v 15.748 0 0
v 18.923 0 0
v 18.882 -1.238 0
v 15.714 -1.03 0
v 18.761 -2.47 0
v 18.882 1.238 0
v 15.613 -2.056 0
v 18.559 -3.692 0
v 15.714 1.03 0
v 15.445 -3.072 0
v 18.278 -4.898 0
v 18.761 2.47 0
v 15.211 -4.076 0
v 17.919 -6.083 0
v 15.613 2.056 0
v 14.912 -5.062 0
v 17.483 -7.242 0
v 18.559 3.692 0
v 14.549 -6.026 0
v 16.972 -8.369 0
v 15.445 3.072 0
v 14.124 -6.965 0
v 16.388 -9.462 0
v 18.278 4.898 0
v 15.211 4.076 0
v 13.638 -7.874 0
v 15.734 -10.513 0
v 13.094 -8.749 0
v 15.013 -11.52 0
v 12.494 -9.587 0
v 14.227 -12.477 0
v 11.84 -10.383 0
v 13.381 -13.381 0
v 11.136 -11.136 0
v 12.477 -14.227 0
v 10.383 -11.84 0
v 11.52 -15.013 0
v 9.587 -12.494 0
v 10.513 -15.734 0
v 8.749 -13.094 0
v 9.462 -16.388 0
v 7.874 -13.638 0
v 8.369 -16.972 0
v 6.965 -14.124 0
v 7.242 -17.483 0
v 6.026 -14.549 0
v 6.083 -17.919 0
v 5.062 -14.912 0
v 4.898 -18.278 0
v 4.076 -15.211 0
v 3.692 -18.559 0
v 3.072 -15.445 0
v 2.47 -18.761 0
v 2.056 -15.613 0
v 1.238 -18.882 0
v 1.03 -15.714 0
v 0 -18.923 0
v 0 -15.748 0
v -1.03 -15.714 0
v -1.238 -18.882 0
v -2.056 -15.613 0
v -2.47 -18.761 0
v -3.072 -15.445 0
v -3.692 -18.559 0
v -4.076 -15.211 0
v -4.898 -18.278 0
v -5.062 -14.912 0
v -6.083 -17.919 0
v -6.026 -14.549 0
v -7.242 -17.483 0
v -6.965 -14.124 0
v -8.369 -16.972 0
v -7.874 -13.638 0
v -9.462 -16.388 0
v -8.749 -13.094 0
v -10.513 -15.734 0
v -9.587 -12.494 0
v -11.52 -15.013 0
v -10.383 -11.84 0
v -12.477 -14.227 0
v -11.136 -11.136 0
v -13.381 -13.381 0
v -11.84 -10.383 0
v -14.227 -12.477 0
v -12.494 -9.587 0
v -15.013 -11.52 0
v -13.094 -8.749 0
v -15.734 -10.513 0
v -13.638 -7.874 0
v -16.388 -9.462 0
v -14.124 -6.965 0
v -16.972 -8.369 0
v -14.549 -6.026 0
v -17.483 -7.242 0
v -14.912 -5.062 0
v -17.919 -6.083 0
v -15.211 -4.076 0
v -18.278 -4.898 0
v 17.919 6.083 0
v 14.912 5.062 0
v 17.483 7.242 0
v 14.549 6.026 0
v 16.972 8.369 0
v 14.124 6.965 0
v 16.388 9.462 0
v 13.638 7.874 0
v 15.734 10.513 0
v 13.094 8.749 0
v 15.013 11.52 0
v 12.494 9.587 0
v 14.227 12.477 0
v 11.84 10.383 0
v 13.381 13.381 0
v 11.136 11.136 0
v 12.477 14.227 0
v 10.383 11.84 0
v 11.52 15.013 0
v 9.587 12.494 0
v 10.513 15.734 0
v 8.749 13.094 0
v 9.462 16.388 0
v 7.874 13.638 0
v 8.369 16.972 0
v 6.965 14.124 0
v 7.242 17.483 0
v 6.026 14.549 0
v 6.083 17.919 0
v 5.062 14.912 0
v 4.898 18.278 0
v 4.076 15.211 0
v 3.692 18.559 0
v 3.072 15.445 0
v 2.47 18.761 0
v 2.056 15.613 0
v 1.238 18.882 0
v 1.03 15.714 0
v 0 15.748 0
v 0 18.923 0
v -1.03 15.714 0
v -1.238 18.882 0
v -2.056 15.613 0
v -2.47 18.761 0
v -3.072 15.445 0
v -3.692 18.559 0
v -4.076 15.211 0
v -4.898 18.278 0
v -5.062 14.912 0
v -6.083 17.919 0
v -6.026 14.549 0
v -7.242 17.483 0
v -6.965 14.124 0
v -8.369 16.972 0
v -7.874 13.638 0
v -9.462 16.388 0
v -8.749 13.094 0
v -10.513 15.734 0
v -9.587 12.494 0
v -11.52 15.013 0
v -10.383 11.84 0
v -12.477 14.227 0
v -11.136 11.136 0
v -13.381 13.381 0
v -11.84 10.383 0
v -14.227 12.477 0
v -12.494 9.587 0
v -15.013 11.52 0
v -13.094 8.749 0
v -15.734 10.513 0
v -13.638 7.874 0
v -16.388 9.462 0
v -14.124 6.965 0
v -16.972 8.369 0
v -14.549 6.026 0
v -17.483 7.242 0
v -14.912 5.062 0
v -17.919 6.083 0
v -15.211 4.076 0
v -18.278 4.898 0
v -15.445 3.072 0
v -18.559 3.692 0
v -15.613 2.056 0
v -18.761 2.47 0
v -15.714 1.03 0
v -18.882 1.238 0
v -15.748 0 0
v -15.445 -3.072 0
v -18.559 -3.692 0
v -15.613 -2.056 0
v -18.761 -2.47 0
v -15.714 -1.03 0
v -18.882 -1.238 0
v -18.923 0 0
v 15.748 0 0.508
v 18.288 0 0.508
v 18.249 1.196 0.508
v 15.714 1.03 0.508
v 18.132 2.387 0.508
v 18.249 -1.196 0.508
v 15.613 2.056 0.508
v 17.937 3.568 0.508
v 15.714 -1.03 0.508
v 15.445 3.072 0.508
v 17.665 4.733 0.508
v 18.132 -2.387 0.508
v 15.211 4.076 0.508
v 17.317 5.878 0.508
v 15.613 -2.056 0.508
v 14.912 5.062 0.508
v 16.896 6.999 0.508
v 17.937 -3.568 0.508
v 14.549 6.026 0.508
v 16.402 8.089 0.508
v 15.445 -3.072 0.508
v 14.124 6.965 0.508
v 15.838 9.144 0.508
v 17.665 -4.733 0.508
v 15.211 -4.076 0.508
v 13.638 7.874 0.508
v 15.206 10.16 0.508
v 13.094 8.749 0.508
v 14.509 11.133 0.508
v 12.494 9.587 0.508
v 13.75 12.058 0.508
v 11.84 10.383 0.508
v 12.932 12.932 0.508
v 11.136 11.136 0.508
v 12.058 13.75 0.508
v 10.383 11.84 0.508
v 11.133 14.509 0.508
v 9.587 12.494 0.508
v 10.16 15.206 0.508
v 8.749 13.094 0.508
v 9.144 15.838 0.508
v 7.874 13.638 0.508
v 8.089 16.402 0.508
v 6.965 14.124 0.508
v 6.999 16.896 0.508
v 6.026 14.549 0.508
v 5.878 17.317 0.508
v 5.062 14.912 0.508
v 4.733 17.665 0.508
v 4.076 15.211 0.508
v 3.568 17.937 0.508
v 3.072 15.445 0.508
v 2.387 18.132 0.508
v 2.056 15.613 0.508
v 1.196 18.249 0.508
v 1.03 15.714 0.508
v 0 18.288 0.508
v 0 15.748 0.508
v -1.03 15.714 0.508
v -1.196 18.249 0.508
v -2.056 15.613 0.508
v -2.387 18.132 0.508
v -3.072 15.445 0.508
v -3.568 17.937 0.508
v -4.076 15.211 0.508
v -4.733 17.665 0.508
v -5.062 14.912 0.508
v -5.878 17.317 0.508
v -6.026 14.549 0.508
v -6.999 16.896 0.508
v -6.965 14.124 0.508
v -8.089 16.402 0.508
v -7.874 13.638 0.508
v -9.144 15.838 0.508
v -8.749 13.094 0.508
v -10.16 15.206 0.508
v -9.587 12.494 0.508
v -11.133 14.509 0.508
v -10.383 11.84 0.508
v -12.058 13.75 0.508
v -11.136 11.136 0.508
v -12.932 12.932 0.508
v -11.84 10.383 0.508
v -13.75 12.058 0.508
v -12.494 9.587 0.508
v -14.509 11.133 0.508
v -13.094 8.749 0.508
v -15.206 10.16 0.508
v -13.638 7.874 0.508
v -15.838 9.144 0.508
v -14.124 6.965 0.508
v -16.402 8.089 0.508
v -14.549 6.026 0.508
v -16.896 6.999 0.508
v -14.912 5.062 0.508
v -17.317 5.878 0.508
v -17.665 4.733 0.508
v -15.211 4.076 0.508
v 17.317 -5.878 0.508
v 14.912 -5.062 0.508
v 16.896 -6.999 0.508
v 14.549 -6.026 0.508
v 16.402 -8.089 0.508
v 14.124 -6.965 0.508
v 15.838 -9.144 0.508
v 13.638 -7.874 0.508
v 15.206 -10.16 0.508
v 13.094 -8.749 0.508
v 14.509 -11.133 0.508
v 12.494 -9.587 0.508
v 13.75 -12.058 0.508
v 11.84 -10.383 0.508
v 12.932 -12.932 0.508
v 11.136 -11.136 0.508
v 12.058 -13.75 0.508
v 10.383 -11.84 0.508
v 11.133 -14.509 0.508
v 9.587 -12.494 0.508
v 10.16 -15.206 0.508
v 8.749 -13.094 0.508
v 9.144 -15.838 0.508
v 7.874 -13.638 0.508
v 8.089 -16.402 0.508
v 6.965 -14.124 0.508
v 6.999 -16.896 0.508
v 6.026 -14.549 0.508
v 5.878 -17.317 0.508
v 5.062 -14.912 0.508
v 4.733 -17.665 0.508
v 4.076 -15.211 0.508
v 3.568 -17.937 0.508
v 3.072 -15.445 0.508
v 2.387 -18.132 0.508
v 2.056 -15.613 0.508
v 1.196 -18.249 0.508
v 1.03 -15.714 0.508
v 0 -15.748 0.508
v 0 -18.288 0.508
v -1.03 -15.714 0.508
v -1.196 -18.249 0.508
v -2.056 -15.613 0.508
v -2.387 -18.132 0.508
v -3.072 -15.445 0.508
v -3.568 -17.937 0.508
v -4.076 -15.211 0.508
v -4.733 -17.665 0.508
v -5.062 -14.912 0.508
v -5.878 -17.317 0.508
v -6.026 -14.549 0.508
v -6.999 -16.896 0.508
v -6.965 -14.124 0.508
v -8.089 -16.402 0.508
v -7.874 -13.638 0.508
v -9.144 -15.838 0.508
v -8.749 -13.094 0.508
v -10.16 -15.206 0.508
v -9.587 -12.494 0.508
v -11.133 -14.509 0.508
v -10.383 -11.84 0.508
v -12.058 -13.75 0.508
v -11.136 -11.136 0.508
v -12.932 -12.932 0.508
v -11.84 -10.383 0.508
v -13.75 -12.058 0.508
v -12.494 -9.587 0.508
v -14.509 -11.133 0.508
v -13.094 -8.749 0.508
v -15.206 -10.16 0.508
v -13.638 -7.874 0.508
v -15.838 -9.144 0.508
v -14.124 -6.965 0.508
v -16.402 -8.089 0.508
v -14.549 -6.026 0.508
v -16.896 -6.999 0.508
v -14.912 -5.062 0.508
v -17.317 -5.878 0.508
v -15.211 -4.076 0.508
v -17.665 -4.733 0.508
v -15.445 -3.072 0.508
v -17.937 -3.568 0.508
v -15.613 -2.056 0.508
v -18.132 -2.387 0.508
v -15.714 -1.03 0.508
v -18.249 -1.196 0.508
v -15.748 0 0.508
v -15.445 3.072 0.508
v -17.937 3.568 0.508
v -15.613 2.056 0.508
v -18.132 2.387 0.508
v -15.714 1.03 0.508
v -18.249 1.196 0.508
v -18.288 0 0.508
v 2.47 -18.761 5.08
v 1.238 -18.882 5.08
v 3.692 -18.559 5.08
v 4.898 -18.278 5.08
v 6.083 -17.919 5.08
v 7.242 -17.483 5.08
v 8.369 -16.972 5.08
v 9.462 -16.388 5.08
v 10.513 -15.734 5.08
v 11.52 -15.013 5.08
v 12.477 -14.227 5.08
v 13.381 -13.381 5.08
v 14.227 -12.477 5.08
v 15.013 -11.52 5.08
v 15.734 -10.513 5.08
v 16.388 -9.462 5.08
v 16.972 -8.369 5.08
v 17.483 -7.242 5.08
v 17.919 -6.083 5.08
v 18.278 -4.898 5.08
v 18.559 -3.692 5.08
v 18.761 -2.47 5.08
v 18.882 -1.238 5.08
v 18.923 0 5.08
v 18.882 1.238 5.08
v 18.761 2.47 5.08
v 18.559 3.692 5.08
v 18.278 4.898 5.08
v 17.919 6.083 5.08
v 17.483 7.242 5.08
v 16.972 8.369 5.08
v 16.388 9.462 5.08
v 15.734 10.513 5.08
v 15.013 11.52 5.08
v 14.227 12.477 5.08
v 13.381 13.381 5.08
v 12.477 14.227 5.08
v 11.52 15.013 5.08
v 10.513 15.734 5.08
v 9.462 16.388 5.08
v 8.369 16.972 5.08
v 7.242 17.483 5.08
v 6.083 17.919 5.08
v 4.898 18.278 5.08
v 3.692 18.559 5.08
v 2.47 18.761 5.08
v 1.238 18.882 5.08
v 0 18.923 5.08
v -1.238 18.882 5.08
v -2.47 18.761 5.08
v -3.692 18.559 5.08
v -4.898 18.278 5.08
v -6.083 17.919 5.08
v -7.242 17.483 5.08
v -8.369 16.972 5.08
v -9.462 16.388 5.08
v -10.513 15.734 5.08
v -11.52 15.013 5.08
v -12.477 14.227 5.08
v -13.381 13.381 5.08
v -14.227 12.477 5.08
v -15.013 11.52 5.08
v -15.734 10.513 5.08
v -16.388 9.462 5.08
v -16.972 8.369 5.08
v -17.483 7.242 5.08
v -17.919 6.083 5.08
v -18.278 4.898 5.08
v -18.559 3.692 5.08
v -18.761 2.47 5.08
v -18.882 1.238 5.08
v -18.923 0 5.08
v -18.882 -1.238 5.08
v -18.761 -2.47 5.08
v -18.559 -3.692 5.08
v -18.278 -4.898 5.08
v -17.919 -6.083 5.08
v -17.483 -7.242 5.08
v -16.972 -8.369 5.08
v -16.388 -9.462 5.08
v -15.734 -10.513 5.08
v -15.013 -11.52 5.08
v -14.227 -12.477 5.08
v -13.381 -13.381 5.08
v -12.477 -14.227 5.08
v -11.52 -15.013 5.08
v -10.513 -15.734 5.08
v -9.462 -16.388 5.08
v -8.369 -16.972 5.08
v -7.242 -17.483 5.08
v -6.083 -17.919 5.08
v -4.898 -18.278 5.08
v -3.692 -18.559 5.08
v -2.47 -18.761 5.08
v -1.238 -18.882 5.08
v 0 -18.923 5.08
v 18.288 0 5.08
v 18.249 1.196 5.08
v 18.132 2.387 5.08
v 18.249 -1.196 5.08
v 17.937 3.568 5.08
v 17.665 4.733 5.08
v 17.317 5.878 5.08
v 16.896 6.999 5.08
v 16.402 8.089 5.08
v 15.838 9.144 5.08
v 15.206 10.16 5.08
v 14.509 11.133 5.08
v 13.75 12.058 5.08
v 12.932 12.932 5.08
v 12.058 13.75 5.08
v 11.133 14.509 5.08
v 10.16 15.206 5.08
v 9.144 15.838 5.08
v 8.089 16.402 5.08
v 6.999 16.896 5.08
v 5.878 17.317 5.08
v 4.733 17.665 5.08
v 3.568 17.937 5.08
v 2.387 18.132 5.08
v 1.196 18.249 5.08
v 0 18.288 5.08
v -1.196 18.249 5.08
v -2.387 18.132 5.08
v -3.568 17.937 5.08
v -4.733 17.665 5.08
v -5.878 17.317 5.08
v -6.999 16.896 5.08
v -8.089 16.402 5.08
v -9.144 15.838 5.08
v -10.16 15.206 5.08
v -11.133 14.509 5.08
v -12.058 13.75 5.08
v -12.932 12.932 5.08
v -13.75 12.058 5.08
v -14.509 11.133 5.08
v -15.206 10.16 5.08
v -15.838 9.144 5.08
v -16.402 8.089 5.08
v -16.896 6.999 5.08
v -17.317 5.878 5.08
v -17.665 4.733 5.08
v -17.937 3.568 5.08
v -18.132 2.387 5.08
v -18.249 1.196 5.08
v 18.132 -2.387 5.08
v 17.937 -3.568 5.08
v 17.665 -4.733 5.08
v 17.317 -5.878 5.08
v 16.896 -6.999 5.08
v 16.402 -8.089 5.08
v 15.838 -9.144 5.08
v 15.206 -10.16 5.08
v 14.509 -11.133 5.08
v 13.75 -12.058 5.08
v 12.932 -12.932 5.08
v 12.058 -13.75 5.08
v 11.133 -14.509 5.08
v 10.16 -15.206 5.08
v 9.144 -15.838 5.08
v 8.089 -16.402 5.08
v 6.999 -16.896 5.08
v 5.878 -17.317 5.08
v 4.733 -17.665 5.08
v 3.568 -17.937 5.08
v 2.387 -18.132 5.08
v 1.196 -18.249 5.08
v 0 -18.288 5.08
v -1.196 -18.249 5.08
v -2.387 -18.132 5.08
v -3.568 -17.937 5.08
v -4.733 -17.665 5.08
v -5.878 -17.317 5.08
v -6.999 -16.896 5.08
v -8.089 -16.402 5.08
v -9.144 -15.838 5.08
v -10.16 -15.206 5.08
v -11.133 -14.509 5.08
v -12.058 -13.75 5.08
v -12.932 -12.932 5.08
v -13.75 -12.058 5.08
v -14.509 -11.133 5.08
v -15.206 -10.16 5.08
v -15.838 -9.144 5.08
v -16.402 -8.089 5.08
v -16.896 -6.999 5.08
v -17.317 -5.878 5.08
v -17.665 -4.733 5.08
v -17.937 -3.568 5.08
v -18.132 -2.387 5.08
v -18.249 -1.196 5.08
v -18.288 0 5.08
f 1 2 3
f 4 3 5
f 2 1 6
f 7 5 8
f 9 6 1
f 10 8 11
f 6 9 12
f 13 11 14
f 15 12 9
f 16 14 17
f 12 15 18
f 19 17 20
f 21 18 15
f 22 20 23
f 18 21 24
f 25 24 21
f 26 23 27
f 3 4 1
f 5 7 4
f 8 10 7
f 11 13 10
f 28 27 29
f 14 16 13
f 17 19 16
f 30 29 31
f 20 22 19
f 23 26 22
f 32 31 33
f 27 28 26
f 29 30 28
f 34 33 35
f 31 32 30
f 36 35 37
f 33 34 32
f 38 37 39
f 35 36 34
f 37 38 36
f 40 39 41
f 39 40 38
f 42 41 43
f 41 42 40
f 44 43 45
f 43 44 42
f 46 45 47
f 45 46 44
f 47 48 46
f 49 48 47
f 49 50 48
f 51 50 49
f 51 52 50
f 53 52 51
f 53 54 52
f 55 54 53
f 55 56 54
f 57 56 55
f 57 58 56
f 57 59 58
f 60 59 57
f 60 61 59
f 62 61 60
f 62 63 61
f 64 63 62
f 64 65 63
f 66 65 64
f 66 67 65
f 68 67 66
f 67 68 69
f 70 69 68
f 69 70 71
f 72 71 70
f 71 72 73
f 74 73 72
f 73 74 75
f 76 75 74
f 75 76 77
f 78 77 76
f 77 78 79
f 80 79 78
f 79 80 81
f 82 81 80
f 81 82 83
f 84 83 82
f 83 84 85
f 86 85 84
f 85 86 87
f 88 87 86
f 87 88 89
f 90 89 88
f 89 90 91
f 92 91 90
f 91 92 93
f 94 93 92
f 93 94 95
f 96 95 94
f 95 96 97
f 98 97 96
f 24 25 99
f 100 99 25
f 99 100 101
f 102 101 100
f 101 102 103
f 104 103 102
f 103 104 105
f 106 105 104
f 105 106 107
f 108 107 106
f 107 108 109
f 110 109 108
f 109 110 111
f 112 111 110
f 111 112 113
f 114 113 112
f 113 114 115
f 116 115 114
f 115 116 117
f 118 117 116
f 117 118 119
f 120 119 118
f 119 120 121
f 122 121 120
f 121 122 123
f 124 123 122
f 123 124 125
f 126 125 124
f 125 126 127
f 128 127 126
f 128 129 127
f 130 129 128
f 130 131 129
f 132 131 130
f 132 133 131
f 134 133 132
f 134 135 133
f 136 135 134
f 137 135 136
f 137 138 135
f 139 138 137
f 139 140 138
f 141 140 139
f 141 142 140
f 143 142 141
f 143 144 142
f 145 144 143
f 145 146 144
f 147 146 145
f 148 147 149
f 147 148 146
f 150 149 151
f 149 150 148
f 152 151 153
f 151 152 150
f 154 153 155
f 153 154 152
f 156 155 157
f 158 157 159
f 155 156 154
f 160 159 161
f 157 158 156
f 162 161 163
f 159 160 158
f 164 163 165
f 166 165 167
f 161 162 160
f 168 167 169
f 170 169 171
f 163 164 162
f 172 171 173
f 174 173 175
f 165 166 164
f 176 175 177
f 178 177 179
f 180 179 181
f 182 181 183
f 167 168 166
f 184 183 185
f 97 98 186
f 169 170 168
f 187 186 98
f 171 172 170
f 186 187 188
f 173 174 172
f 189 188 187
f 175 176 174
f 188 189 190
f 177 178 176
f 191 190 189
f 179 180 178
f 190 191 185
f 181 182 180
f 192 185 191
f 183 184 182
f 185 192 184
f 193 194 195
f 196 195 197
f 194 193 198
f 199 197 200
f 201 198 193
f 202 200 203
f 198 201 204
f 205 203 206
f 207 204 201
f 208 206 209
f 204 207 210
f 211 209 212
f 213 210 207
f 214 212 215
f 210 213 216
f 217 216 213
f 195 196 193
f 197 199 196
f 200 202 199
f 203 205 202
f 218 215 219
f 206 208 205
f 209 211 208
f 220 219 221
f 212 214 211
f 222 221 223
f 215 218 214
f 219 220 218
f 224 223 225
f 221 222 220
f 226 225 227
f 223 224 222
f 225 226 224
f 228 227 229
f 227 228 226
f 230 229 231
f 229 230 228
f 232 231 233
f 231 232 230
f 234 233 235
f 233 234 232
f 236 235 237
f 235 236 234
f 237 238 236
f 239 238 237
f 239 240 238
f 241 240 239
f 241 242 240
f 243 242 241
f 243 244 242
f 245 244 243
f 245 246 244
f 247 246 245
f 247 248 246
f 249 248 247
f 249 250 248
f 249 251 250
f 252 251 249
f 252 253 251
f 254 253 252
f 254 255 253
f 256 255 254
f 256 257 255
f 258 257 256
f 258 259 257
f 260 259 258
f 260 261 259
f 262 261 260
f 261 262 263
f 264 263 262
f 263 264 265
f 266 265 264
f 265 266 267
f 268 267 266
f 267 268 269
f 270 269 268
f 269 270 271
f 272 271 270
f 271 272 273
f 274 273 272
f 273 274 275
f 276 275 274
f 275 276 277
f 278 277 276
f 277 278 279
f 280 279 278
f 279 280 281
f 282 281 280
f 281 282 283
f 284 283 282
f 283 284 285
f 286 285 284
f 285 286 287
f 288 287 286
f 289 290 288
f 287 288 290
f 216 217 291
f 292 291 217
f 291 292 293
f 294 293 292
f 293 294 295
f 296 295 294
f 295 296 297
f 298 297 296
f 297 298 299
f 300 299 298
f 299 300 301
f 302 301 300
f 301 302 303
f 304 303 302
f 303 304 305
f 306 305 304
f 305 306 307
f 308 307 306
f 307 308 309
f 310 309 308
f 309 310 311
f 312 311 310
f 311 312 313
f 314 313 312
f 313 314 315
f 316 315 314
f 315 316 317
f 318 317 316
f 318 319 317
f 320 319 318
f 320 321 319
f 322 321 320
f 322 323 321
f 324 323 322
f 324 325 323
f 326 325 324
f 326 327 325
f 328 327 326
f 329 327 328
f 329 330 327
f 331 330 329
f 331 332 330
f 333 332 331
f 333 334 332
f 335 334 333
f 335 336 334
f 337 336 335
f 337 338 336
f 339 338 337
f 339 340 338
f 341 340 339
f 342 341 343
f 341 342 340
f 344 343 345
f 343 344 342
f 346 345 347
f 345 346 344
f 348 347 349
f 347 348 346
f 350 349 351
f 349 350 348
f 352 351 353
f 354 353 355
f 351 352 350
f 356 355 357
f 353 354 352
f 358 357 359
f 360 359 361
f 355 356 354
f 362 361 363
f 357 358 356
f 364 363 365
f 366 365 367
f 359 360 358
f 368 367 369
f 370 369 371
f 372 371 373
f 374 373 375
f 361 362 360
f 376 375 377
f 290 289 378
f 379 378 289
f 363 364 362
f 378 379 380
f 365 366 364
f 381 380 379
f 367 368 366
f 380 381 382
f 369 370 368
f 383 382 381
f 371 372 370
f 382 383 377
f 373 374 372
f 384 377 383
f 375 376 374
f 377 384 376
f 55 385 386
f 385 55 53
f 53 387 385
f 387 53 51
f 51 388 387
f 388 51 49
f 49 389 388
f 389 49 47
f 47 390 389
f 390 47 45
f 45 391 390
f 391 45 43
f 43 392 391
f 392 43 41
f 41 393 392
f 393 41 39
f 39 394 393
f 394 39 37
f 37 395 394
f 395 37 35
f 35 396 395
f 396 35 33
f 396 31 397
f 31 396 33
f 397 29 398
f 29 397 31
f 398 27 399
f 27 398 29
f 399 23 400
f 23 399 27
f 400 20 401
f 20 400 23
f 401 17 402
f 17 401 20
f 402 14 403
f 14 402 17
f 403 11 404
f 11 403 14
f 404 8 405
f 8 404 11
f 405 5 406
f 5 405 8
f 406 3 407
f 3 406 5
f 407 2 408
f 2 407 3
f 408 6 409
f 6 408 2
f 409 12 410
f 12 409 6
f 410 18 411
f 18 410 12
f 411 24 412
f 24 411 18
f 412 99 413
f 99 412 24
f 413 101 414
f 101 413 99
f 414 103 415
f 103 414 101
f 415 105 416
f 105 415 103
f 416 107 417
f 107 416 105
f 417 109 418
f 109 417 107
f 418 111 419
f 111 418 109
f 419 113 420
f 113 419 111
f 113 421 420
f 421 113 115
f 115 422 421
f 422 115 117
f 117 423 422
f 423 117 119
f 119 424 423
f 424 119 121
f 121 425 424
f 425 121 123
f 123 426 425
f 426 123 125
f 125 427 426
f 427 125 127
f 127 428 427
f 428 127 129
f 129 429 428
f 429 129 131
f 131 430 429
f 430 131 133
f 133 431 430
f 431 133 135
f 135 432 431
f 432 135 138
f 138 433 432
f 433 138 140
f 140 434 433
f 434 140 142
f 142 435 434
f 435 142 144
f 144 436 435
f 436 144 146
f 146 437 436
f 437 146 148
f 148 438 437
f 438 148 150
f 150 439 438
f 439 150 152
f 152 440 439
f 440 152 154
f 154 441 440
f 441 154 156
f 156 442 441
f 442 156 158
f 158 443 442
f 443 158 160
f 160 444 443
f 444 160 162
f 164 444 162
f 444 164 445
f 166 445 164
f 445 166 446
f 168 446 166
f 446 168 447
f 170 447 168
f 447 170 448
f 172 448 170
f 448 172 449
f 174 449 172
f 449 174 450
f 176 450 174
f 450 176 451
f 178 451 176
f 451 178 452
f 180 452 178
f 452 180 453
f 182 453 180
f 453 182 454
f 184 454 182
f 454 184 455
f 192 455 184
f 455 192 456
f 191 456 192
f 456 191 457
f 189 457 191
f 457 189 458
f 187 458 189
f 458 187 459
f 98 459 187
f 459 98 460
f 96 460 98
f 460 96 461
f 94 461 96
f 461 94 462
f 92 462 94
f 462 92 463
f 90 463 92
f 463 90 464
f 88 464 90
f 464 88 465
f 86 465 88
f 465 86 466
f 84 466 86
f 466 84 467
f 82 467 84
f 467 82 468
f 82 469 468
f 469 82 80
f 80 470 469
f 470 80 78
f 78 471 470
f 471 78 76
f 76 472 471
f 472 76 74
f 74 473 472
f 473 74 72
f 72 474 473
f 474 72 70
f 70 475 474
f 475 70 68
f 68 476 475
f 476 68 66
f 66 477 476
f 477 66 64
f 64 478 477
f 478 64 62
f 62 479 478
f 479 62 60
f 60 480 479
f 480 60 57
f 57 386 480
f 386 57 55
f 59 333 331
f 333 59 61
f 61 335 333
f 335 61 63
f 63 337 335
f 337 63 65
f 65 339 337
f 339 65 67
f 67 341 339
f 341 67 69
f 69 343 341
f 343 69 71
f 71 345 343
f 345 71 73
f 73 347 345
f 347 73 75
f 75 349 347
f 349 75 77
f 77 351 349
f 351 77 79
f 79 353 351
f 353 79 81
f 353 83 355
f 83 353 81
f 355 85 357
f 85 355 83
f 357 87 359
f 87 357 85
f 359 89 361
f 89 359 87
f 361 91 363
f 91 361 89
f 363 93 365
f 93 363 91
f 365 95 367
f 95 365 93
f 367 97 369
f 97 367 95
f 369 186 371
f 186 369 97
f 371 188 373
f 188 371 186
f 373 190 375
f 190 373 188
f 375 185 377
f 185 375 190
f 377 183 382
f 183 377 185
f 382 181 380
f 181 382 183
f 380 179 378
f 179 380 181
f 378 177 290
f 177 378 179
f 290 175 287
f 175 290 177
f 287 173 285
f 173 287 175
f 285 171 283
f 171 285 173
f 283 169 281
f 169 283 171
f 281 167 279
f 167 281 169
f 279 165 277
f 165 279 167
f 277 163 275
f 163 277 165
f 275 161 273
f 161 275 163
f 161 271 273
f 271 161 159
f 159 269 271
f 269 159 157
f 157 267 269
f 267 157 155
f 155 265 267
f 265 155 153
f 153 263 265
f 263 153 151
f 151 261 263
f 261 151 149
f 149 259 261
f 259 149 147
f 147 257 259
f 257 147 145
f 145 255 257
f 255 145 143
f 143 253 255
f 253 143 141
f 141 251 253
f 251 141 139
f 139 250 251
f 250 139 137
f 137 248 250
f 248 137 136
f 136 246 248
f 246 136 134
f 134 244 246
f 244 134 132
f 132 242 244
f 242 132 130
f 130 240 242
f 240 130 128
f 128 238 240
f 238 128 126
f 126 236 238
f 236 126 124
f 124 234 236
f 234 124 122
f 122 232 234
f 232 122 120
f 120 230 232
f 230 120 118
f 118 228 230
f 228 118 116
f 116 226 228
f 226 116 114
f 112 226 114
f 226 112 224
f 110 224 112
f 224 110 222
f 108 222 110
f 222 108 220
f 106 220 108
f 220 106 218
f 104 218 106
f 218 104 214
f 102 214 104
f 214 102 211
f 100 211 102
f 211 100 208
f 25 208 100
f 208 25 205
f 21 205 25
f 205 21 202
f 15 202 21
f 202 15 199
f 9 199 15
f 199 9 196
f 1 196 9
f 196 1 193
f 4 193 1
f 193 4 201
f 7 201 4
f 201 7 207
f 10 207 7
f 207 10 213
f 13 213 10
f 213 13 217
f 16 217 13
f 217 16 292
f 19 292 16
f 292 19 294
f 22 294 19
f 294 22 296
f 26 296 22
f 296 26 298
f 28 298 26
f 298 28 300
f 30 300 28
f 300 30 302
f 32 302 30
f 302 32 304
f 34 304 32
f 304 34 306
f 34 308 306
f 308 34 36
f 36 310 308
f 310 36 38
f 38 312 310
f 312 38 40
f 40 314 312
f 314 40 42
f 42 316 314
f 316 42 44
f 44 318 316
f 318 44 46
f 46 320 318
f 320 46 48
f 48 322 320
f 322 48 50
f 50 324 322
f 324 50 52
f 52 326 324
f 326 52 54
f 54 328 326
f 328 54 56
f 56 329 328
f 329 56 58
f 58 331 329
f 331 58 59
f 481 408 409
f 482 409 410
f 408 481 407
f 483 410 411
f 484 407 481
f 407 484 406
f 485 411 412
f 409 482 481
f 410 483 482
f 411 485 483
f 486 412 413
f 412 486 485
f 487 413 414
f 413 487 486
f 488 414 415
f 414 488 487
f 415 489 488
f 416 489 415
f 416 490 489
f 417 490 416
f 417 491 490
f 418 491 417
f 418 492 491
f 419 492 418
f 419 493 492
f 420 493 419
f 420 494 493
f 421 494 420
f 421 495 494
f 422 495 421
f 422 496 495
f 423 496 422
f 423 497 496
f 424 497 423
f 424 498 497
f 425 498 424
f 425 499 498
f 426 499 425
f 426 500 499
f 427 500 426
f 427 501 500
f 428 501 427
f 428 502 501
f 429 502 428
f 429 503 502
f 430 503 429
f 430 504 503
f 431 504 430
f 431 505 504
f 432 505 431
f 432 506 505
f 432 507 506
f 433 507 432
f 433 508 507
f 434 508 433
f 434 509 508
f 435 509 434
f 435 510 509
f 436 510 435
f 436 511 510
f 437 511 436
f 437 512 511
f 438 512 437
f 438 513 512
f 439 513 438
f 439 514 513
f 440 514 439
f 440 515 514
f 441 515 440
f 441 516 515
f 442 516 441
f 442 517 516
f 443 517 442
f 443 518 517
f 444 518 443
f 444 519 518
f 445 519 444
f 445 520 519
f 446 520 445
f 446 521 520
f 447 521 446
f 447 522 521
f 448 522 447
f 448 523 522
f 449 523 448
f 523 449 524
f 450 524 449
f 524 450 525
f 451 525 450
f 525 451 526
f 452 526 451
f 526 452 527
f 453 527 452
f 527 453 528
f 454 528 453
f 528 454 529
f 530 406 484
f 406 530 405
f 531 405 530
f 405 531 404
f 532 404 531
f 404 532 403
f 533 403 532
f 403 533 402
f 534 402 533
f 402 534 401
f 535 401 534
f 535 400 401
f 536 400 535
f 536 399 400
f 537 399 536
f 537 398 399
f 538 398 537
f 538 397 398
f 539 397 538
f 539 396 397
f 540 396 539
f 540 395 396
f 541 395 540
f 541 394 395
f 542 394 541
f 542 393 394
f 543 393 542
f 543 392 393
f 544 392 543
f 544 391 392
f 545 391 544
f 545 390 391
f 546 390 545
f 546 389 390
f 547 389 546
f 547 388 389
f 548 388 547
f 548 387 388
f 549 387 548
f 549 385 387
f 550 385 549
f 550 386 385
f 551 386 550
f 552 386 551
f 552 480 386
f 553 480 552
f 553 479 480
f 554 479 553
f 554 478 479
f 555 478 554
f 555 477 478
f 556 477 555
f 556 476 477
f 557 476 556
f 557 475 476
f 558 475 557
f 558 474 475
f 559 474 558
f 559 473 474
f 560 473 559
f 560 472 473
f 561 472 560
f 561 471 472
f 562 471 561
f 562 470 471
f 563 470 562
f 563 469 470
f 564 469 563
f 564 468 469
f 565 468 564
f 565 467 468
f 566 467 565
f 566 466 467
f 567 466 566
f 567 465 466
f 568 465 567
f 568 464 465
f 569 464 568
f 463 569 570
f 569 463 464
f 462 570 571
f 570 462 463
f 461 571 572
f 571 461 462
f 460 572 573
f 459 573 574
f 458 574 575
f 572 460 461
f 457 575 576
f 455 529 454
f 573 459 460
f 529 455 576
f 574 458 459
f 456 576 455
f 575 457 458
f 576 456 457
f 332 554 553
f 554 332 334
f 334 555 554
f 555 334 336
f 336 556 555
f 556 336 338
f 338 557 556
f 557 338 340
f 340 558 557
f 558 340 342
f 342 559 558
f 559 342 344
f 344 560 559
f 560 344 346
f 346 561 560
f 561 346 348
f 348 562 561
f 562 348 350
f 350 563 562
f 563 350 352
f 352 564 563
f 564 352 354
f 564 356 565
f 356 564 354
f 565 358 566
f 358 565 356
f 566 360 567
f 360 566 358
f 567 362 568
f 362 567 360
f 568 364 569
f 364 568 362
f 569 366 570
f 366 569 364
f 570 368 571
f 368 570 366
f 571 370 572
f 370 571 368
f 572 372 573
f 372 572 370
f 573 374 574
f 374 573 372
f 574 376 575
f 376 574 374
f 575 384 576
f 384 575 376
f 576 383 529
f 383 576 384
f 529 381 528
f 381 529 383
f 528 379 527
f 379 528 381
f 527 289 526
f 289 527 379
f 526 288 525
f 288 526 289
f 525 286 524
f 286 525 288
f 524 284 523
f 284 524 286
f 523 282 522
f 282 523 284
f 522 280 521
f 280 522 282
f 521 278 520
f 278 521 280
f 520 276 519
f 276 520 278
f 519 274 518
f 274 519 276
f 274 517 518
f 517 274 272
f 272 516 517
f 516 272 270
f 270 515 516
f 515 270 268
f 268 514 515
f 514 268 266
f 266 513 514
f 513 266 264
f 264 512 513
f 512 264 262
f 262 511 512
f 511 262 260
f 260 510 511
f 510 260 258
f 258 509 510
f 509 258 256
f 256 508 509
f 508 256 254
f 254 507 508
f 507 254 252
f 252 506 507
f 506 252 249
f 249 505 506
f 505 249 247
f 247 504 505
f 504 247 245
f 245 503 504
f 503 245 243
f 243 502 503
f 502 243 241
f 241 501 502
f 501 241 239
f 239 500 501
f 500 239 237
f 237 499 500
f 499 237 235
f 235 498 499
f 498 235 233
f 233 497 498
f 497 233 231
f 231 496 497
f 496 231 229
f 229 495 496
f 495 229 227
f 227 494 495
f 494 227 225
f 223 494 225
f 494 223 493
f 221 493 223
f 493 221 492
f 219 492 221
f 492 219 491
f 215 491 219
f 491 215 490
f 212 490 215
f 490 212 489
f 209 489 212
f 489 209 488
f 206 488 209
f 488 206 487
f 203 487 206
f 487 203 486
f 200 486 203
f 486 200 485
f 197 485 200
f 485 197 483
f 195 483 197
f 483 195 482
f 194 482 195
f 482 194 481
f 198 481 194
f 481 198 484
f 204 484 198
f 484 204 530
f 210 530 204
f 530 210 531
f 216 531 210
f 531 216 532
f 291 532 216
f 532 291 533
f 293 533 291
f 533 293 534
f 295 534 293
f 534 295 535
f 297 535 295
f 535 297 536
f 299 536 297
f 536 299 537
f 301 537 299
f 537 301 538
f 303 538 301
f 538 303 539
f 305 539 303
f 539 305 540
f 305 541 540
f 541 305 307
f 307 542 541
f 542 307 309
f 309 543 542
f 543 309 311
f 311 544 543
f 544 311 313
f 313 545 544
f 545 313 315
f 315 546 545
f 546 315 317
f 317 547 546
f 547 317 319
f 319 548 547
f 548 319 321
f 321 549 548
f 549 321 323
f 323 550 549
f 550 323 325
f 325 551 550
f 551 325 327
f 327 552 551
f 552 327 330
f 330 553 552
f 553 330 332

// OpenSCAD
ViewScale = [0.0254, 0.0254, 0.0254];

module case()
{
    linear_extrude(20)
    difference() {
        circle(1490/2, $fn=96);
        circle(1240/2, $fn=96);
    }
    // Outer
    linear_extrude(200)
    difference() {
        circle(1490/2, $fn=96);
        circle(1440/2, $fn=96);
    }
}

scale(ViewScale)
{
    case();
}
